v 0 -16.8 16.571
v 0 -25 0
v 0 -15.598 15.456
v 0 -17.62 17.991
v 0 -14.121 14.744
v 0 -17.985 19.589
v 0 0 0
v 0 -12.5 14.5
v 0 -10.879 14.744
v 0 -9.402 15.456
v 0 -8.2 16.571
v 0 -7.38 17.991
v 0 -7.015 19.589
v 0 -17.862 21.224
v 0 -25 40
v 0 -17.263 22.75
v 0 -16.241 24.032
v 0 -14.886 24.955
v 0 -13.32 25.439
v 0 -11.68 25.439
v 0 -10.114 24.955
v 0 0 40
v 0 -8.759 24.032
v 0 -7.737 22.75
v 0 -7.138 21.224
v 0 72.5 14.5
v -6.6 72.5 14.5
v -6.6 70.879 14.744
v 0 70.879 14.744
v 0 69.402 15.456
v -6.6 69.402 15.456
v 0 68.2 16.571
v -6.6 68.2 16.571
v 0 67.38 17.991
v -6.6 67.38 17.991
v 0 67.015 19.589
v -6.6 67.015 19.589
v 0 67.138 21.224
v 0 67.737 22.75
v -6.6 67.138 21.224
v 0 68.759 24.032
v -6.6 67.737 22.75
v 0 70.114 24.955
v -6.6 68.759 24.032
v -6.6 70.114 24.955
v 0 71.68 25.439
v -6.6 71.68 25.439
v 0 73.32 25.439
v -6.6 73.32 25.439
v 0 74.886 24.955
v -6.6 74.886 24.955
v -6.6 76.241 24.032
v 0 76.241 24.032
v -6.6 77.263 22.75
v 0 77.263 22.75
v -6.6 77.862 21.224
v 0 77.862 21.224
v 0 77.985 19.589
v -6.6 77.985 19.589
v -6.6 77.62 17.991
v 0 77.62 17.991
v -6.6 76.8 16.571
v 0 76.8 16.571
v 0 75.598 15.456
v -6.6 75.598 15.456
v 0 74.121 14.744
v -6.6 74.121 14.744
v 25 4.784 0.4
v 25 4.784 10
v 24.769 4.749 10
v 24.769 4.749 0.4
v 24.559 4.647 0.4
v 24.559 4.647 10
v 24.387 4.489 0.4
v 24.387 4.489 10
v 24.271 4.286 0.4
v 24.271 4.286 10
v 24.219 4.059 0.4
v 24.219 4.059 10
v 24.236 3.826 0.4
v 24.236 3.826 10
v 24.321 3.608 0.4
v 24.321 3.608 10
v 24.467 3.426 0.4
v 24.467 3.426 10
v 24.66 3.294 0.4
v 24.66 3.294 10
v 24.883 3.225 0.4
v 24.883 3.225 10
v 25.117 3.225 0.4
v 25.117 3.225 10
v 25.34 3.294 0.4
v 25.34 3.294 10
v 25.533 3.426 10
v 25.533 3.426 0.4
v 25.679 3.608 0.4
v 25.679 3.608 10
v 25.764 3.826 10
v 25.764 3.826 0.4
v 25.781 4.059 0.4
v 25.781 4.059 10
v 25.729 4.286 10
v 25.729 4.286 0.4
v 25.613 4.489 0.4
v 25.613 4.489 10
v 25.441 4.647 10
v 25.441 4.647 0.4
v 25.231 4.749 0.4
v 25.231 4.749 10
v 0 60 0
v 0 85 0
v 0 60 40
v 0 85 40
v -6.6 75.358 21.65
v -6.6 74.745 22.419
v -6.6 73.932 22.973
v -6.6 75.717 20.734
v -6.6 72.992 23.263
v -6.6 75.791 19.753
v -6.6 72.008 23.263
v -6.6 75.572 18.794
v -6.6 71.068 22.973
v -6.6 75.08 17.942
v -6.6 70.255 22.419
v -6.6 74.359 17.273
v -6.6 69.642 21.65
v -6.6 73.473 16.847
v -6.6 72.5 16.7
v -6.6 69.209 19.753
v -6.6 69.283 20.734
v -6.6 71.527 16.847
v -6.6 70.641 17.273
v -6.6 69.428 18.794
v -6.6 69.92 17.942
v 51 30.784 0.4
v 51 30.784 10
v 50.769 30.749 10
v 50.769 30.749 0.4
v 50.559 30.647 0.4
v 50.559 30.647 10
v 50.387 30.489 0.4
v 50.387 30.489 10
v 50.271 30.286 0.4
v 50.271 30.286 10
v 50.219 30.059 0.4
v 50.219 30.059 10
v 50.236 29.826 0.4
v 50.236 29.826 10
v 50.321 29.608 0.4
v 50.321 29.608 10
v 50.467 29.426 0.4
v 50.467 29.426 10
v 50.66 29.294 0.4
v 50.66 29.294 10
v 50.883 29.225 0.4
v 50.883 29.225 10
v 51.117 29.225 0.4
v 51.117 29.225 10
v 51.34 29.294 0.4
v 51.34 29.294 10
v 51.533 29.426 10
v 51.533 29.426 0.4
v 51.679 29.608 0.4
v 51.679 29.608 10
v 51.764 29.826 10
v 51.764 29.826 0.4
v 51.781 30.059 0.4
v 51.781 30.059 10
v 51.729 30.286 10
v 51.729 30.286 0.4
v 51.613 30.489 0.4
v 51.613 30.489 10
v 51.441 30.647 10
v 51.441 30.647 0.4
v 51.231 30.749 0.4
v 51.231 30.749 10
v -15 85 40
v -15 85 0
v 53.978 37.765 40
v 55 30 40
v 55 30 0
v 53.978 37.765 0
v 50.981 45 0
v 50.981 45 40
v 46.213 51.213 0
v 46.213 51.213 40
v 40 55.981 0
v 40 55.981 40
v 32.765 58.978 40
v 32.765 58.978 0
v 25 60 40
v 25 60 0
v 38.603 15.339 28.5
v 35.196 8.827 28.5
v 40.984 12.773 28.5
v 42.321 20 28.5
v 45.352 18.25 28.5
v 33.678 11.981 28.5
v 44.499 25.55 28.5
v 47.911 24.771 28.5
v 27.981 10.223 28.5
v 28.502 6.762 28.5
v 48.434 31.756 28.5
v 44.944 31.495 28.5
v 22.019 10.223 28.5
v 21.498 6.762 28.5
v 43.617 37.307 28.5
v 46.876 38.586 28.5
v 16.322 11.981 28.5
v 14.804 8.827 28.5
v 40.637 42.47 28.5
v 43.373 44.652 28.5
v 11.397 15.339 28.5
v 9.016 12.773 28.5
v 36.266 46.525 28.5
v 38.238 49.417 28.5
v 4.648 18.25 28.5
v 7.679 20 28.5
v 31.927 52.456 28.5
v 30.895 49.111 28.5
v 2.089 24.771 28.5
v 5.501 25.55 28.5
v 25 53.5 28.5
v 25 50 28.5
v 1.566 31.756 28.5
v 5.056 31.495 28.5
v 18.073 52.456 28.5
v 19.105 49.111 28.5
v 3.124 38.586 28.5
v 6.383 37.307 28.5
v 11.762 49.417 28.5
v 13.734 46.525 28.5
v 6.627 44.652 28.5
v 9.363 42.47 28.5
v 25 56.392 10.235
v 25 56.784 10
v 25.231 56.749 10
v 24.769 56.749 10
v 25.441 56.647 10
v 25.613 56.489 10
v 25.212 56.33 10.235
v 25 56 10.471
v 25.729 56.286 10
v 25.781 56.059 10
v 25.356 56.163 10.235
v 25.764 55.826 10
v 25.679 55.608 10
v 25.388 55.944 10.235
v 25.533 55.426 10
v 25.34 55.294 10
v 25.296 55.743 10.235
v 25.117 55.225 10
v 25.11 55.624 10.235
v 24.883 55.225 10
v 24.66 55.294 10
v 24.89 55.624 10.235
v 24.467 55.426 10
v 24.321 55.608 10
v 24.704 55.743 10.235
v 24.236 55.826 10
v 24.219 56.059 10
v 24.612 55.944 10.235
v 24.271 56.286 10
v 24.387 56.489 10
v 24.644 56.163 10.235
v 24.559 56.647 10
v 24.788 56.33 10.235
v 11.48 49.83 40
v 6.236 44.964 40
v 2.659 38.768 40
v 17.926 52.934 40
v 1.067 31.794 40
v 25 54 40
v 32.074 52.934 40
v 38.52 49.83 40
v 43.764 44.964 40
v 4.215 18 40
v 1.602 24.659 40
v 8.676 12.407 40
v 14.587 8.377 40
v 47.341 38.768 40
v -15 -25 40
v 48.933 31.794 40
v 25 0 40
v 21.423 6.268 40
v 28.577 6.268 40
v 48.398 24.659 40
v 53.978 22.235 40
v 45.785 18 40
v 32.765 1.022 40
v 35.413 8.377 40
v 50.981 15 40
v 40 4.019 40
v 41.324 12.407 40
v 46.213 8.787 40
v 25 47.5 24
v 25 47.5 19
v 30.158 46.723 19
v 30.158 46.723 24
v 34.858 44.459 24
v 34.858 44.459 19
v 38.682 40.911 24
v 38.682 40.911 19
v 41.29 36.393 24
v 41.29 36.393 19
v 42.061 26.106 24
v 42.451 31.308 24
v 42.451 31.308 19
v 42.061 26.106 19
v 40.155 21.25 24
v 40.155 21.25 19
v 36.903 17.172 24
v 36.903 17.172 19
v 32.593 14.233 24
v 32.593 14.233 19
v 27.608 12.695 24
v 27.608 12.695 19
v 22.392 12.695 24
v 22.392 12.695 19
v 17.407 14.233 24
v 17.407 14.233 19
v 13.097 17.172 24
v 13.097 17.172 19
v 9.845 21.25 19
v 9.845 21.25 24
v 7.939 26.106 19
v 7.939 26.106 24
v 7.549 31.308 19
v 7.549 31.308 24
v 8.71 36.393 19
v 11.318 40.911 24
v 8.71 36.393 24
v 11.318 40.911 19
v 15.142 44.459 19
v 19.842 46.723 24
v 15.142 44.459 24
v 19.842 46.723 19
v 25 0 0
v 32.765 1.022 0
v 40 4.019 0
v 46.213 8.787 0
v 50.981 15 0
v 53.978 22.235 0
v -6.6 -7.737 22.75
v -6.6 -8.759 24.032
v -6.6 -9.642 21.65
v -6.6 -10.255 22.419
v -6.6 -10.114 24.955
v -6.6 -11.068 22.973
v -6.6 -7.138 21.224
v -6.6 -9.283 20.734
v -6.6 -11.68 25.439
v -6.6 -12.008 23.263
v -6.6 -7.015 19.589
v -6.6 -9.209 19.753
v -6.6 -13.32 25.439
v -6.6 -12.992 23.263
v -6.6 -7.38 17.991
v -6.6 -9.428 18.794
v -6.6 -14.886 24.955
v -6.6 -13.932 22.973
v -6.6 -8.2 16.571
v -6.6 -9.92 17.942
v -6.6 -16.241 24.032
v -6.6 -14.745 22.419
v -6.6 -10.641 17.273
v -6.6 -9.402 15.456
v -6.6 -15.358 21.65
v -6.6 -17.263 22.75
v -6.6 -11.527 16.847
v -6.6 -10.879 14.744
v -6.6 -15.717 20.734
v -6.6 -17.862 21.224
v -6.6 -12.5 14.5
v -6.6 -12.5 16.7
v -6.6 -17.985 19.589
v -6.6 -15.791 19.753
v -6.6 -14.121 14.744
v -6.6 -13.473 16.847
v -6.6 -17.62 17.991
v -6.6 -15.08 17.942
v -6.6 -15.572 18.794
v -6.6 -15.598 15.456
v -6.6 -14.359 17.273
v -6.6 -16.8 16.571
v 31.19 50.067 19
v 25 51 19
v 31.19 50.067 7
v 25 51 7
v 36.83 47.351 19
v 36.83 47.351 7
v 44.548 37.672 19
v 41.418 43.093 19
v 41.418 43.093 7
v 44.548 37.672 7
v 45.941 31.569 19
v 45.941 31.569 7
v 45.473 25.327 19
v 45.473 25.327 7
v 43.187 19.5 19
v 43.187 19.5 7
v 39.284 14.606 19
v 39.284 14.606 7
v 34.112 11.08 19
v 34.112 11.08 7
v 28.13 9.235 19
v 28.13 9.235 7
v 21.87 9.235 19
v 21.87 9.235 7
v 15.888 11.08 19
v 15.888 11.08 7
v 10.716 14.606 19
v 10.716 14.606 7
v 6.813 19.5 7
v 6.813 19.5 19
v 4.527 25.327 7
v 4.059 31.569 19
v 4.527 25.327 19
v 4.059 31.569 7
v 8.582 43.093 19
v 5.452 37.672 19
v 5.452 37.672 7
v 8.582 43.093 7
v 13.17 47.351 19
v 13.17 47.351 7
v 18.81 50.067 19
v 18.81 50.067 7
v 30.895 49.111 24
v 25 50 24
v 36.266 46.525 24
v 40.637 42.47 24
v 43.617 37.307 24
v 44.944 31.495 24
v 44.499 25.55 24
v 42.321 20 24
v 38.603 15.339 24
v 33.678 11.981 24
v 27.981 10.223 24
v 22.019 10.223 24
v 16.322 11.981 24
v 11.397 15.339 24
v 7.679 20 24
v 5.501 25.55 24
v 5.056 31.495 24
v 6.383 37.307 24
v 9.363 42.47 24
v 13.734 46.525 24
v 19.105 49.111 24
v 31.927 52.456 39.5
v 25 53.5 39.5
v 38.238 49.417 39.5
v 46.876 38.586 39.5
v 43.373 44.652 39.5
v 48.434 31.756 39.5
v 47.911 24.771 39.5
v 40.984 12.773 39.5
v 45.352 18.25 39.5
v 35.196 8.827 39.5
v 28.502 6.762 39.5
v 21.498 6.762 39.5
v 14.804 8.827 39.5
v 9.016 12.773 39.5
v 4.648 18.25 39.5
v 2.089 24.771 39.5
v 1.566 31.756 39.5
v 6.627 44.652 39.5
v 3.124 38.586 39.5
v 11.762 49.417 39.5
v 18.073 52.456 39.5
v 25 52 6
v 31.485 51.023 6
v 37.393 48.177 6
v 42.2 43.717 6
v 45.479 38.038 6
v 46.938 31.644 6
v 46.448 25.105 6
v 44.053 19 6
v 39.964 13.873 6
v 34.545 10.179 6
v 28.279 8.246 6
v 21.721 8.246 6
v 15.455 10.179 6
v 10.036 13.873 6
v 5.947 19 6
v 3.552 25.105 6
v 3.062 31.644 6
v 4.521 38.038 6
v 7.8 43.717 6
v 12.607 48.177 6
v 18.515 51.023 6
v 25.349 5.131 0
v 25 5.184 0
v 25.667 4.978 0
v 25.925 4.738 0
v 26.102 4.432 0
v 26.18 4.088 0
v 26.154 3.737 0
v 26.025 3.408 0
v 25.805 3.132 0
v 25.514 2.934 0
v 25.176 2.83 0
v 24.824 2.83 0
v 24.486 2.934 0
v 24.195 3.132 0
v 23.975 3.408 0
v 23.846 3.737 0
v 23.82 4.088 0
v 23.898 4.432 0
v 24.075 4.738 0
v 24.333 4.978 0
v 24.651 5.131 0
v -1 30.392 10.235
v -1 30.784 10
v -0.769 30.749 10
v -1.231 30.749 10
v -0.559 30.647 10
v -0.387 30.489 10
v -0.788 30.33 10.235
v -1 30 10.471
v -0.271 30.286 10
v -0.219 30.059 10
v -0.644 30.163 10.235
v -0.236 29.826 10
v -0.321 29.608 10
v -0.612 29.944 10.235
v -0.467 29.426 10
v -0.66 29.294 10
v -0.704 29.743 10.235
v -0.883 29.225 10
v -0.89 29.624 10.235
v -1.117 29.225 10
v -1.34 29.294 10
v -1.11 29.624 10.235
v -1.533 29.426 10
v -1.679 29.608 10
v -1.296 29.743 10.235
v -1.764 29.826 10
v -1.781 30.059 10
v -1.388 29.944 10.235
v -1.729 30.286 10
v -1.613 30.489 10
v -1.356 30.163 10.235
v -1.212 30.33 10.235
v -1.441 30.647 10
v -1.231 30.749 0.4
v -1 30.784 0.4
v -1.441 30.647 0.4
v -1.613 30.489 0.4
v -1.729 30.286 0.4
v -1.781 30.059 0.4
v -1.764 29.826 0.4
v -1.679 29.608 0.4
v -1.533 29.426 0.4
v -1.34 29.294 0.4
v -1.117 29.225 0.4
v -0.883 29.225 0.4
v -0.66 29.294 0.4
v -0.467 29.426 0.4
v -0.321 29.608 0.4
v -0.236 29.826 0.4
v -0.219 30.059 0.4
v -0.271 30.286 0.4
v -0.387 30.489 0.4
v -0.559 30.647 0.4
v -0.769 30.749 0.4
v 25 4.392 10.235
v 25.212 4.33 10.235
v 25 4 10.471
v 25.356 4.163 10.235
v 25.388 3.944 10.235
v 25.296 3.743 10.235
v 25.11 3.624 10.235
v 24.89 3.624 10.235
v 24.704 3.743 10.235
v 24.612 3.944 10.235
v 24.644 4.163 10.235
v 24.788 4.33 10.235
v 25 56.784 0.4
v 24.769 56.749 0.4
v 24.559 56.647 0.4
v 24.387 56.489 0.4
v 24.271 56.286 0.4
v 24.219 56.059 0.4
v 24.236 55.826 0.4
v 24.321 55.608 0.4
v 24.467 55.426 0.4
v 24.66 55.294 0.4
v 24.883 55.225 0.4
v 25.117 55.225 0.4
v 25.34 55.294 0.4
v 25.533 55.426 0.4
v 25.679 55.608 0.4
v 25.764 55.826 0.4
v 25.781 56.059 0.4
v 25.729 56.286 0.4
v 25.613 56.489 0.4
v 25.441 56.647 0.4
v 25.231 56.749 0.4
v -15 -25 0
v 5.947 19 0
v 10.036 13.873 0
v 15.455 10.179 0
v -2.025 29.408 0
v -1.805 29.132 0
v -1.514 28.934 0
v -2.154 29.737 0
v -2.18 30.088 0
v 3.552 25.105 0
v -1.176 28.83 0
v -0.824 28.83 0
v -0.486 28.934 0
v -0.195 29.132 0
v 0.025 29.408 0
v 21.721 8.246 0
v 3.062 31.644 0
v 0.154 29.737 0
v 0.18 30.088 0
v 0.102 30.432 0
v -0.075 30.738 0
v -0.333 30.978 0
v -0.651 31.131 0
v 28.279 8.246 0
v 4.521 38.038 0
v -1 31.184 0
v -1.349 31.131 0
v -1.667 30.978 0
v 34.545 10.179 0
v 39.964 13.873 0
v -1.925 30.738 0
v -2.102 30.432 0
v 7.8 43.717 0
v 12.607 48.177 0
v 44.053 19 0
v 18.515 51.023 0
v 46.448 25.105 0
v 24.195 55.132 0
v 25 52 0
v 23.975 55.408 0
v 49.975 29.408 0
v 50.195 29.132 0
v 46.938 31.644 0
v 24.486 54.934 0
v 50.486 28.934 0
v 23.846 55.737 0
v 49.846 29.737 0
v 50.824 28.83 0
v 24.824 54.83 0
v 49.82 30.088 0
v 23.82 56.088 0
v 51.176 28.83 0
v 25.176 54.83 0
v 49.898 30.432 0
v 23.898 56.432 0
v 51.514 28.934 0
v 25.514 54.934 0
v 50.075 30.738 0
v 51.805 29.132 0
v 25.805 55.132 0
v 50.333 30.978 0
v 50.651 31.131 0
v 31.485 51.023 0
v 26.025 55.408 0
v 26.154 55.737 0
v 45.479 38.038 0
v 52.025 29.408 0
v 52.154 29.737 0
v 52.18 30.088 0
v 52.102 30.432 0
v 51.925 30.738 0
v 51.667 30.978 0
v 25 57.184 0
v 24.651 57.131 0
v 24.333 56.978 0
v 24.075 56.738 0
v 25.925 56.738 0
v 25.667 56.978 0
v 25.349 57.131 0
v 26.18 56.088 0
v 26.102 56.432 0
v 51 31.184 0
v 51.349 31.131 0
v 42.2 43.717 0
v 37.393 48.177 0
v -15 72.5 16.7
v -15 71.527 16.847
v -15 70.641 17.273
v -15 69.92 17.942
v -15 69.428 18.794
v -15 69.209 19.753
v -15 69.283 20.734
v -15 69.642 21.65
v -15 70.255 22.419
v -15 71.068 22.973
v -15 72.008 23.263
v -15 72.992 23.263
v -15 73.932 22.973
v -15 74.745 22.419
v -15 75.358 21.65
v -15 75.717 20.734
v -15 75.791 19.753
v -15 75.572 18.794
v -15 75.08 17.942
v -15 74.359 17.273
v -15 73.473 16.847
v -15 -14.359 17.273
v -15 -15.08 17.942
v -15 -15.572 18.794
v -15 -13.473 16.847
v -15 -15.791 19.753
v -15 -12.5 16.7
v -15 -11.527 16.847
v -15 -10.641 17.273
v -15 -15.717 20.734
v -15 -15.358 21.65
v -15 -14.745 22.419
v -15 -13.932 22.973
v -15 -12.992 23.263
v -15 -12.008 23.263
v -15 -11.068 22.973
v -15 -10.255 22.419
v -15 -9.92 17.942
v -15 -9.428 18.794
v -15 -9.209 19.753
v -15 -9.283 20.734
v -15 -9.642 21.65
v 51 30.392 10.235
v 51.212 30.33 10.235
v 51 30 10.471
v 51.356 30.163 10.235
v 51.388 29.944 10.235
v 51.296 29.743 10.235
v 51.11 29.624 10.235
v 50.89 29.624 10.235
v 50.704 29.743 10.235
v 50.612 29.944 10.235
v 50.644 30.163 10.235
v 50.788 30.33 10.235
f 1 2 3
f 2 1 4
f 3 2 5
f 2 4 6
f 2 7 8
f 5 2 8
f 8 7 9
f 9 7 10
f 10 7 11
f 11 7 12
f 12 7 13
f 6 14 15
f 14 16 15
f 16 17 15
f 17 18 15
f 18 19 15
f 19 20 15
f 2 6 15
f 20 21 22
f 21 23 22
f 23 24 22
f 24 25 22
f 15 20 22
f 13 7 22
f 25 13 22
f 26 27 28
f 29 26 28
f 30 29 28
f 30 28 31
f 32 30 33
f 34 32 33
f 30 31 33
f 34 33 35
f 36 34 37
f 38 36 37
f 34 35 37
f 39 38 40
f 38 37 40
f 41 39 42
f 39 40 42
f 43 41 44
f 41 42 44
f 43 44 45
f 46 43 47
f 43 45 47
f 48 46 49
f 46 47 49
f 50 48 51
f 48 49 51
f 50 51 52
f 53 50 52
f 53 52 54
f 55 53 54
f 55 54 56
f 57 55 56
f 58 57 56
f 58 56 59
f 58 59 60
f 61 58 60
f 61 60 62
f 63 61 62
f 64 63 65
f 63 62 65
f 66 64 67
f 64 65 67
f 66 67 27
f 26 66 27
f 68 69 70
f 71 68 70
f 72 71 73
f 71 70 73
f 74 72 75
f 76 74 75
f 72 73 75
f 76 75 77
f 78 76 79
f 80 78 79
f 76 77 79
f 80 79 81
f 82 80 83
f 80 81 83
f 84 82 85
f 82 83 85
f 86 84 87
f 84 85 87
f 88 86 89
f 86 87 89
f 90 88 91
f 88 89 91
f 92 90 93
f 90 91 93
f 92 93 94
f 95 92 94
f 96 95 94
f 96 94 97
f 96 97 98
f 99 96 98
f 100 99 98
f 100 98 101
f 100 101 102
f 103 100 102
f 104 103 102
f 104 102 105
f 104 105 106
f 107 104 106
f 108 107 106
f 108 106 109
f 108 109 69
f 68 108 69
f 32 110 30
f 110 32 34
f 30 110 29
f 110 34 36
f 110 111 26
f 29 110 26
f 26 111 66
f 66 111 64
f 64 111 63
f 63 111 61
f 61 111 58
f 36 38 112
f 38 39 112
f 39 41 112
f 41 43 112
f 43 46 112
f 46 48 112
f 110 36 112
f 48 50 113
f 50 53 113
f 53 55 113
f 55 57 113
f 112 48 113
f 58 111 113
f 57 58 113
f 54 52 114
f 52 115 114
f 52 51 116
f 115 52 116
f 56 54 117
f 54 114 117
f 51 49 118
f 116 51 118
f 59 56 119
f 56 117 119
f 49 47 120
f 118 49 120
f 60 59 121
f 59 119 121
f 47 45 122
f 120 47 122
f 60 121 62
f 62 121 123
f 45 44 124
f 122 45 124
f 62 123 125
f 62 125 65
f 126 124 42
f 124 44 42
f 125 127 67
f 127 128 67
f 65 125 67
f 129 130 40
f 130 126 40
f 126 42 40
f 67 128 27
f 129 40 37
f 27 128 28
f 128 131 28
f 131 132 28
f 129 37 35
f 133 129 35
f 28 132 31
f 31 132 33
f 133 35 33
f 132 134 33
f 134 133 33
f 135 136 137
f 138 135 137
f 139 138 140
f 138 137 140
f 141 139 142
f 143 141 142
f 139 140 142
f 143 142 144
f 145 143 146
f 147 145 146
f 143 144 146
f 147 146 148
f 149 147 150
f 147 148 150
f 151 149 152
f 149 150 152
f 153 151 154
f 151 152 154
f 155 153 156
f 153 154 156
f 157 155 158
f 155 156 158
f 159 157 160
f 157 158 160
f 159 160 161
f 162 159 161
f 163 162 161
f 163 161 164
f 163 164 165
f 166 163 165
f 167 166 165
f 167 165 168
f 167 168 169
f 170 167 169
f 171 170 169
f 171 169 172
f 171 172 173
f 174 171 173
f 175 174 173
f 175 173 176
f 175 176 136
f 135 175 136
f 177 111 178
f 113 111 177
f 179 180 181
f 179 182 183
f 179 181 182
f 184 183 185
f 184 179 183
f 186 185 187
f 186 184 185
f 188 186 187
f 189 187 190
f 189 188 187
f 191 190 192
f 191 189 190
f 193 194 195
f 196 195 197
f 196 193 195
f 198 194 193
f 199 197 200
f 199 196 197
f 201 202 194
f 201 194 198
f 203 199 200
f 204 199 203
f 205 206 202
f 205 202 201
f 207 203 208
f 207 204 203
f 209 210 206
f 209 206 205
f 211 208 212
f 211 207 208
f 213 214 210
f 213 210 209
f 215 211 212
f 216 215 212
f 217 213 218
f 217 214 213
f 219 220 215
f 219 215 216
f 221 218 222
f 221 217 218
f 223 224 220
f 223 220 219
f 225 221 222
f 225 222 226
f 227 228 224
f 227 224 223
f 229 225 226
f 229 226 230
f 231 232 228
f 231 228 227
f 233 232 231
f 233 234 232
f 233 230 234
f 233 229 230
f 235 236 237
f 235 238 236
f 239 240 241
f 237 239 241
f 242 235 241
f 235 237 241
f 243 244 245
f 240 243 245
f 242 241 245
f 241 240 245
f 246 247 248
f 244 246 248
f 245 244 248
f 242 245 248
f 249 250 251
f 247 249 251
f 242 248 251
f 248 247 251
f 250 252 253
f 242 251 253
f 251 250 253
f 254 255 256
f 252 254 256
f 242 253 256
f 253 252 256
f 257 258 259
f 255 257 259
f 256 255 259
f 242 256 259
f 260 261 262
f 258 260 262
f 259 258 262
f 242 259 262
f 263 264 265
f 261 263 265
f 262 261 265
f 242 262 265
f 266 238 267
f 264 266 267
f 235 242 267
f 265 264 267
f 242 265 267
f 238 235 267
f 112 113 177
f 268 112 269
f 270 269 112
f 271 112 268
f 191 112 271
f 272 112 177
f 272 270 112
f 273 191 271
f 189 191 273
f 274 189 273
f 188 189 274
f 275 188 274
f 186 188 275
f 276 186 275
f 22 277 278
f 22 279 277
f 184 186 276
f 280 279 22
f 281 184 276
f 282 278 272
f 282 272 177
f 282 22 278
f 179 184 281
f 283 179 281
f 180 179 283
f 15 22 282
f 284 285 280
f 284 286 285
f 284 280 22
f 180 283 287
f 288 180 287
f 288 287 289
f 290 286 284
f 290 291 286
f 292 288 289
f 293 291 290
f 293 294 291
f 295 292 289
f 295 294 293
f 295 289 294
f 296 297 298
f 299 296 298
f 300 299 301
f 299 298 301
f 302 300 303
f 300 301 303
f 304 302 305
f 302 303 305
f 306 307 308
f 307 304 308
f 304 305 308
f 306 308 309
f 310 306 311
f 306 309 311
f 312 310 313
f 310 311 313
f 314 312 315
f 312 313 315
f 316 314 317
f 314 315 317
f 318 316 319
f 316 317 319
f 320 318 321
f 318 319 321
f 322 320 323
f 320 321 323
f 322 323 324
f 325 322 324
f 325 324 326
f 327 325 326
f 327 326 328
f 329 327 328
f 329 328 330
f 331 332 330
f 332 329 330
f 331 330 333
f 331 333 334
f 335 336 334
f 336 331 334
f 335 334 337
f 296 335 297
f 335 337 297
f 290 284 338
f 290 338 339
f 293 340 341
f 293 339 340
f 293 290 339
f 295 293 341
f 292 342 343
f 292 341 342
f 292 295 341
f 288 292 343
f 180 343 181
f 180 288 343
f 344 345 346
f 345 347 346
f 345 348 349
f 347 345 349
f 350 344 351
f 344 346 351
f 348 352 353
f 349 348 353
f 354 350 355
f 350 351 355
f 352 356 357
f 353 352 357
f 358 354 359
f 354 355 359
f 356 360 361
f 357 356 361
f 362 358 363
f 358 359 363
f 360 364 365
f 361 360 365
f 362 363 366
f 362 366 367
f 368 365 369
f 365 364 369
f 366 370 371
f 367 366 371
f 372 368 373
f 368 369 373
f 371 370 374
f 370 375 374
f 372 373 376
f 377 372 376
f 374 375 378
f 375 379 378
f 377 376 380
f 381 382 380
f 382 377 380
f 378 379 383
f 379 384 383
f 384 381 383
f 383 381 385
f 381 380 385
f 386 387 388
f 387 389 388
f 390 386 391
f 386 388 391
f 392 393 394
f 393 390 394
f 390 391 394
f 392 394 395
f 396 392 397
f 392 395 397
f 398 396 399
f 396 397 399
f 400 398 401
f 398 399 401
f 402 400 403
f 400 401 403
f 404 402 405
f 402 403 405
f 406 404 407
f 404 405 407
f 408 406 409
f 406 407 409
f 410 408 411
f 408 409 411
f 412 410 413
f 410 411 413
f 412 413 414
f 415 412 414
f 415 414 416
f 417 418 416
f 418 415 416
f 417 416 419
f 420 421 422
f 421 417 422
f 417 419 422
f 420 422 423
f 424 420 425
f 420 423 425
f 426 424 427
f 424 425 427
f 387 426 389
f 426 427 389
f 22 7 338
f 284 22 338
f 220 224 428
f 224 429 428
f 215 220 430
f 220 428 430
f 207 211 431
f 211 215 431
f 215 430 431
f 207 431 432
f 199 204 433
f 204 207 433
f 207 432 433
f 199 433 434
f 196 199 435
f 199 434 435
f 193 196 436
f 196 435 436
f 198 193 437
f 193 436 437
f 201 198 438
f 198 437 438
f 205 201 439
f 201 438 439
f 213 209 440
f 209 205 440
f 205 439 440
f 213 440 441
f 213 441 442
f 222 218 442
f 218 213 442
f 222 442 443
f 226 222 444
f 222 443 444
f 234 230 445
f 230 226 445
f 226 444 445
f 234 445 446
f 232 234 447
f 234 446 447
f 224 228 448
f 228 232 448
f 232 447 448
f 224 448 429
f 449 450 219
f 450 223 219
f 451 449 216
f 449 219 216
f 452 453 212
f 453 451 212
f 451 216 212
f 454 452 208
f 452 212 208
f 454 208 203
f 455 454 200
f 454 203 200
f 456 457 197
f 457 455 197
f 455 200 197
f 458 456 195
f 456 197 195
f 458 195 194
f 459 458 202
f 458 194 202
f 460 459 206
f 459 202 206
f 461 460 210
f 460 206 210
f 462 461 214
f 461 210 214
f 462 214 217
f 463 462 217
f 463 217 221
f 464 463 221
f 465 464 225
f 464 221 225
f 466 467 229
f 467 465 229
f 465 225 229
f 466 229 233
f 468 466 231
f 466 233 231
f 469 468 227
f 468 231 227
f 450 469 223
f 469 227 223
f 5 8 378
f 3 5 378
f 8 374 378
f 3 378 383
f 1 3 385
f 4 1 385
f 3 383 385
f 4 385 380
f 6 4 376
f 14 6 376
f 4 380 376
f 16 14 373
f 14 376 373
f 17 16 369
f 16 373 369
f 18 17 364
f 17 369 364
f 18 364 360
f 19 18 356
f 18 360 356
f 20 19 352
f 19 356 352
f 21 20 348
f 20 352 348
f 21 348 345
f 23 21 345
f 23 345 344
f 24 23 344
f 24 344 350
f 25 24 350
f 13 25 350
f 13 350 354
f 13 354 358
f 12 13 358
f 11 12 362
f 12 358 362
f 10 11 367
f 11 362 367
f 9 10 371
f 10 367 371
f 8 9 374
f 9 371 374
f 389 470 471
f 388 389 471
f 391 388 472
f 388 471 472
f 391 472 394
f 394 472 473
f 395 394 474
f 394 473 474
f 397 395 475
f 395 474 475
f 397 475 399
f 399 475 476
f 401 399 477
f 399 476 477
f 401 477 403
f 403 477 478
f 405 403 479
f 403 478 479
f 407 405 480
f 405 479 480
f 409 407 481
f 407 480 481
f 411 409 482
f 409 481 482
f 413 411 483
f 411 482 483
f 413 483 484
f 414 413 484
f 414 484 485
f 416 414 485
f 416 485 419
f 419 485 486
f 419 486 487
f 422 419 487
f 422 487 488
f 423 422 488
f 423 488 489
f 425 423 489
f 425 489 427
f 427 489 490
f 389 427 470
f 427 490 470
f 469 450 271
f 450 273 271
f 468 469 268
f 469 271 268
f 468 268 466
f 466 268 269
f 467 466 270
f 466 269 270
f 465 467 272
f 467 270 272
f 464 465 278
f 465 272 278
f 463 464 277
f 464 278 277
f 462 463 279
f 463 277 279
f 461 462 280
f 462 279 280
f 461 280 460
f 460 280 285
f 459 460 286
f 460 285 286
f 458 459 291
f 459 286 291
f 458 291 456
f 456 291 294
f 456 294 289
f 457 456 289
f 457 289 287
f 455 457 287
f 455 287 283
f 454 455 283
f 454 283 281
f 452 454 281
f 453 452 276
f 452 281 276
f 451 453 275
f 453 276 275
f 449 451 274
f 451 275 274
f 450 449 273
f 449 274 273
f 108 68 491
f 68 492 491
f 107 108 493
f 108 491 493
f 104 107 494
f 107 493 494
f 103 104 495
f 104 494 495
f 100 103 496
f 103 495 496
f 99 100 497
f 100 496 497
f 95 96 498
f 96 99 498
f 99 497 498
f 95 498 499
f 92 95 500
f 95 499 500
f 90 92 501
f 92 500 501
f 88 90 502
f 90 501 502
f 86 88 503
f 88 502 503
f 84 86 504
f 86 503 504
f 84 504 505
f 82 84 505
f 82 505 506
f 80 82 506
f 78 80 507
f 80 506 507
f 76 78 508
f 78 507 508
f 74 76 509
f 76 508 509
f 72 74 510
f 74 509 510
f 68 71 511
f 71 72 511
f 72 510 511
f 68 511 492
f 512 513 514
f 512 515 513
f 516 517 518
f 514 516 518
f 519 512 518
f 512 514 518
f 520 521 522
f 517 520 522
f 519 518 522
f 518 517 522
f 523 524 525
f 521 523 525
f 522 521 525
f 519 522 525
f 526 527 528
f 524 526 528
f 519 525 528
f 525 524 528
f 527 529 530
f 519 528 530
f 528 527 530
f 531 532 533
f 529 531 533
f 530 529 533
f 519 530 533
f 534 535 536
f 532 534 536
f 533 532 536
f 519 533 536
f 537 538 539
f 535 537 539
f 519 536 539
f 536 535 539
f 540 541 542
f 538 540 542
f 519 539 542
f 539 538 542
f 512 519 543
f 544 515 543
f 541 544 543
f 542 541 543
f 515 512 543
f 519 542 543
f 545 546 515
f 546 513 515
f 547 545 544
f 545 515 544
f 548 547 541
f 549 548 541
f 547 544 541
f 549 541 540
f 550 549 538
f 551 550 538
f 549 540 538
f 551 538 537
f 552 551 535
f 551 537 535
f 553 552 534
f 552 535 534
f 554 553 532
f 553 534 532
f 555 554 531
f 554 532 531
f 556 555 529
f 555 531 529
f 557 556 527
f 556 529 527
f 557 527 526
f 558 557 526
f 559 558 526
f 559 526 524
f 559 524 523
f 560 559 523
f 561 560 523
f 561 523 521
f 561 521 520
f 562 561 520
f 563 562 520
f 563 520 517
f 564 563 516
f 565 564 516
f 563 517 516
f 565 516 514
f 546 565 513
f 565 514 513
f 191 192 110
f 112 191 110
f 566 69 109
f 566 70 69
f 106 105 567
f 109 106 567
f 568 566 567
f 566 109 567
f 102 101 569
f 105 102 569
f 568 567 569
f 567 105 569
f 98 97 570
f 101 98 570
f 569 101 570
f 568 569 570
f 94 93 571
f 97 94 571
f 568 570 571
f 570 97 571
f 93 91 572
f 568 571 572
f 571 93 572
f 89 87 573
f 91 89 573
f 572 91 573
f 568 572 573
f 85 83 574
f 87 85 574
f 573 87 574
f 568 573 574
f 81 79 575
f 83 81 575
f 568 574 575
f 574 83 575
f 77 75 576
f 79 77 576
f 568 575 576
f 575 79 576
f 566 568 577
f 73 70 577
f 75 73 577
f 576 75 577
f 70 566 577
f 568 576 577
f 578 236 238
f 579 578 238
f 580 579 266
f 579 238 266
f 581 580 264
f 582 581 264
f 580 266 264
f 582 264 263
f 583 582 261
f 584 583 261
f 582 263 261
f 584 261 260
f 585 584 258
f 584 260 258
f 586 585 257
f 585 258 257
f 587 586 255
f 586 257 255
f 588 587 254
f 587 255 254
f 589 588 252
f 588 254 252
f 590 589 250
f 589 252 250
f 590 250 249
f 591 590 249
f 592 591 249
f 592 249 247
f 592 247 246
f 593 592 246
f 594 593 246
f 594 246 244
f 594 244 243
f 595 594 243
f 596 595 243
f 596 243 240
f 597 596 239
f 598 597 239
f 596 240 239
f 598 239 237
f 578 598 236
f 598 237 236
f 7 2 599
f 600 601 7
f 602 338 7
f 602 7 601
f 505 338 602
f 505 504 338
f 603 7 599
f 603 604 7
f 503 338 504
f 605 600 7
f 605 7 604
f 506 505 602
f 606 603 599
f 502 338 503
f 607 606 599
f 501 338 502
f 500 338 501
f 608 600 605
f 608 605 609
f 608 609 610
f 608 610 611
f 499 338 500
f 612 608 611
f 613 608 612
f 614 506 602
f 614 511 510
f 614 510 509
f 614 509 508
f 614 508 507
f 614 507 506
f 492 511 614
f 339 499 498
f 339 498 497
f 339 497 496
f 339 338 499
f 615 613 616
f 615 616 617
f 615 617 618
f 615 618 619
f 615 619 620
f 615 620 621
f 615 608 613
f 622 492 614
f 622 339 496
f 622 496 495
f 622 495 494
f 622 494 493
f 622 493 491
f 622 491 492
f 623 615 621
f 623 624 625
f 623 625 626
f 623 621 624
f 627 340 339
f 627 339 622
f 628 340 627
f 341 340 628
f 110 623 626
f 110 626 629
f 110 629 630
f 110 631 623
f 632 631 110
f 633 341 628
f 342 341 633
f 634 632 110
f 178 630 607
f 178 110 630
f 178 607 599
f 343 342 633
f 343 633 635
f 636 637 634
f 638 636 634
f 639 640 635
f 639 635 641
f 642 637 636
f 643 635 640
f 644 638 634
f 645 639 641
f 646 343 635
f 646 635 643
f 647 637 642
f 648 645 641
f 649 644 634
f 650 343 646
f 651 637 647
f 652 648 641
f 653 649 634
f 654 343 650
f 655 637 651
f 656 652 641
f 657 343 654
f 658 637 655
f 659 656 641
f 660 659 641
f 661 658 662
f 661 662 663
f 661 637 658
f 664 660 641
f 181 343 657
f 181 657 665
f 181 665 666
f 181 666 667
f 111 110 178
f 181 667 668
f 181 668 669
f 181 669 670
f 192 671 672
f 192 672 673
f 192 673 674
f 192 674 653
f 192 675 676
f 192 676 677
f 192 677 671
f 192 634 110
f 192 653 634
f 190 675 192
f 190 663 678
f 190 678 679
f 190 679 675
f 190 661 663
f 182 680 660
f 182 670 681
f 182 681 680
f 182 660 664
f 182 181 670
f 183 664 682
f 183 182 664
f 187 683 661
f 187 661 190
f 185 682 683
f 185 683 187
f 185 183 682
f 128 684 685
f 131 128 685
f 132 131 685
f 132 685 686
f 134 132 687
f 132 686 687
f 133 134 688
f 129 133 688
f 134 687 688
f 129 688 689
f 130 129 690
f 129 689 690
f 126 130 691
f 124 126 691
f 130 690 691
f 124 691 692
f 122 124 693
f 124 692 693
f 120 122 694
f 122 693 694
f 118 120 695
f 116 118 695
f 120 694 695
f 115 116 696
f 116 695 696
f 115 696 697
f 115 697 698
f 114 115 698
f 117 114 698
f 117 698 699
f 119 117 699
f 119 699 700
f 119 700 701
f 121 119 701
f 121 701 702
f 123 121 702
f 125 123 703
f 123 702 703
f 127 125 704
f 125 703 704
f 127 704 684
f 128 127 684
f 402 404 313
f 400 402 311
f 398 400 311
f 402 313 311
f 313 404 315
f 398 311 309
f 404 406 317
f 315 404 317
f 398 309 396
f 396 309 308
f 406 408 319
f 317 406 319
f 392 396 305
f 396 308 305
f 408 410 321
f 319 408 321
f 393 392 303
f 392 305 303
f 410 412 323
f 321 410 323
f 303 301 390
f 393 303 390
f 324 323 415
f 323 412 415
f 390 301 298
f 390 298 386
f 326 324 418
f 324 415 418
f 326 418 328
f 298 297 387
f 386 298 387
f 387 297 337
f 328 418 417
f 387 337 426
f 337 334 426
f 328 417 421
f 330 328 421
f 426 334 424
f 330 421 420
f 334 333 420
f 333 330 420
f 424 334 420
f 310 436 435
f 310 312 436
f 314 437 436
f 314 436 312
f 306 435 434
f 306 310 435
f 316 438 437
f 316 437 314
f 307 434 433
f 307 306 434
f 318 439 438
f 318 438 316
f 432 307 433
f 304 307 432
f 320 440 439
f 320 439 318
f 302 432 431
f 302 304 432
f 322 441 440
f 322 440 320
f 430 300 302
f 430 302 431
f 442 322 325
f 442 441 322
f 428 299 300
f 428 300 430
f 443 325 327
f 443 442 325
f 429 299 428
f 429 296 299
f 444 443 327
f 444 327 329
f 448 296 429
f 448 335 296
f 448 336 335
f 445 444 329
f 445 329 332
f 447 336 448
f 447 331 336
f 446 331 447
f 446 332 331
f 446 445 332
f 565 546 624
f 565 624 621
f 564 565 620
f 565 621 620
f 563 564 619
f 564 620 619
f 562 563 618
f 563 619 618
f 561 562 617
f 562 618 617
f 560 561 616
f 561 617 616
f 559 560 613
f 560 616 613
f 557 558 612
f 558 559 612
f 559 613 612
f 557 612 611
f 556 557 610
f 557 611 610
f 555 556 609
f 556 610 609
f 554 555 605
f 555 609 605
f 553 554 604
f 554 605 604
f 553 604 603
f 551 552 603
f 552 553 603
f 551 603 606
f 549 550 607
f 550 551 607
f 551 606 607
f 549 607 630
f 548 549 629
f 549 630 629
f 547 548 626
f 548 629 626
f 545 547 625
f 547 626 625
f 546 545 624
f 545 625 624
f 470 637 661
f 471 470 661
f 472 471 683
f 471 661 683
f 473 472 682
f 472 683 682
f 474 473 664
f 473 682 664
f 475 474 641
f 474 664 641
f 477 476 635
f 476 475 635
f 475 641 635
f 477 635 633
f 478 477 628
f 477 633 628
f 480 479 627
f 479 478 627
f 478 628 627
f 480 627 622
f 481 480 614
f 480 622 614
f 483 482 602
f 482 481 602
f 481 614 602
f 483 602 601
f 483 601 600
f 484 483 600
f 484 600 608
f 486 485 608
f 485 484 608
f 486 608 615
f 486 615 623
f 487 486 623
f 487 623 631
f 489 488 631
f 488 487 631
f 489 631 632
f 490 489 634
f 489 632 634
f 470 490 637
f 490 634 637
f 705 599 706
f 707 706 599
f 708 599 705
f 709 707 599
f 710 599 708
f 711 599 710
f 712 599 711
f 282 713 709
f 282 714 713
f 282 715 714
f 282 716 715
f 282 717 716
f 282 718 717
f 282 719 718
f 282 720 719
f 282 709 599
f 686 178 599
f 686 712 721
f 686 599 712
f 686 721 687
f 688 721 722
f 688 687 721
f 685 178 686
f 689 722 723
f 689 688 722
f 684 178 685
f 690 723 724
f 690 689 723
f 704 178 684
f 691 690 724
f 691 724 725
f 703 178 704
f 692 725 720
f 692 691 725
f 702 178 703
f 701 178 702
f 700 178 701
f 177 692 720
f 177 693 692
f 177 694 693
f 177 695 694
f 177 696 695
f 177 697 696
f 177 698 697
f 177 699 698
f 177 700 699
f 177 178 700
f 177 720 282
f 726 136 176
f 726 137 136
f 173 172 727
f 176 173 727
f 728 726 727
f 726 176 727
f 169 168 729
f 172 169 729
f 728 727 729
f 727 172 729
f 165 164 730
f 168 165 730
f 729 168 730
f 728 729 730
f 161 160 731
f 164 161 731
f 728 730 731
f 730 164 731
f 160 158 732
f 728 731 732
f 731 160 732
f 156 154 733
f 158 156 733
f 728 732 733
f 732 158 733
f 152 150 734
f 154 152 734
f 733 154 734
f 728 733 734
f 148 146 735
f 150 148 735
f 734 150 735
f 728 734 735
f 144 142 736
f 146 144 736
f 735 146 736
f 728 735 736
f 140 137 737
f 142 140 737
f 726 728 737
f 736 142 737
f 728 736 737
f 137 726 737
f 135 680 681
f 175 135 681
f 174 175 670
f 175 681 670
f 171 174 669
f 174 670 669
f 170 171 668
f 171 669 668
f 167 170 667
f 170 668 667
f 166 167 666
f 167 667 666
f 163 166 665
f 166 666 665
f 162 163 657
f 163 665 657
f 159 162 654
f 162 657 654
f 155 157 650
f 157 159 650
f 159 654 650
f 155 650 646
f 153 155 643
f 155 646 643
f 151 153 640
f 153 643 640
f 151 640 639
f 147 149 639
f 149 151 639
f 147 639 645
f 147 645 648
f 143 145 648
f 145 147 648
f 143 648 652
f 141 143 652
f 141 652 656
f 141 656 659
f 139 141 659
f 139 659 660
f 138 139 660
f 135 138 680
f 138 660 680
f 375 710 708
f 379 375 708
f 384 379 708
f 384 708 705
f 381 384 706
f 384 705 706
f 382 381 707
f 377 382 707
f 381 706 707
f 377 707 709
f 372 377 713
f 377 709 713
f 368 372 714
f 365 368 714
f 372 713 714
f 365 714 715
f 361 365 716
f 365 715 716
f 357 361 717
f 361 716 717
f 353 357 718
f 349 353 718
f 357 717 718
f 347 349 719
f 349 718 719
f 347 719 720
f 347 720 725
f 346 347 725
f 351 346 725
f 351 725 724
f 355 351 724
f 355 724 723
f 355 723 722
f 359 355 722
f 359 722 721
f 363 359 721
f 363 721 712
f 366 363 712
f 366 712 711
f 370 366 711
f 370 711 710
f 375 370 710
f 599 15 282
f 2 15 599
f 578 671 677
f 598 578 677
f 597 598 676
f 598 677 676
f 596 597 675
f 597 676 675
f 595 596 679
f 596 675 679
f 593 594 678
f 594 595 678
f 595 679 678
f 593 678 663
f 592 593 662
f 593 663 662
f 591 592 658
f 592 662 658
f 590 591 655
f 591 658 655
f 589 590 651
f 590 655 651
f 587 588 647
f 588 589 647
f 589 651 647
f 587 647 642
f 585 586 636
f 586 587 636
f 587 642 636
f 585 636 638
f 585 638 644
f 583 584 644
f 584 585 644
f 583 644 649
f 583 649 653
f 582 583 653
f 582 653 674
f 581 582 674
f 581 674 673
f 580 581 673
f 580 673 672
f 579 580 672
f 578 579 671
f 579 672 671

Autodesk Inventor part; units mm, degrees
ref_plane "YZ Plane" through (0, 0, 0) normal (1, 0, 0) x (0, 1, 0)
ref_plane "XZ Plane" through (0, 0, 0) normal (0, 1, 0) x (-1, 0, 0)
sketch "Skizze1" plane through (0, 0, 0) normal (0, 0, 1) x (1, 0, 0)
  line L0 (0, 0) -> (55, 0)
  line L1 (55, 0) -> (55, 60)
  line L2 (55, 60) -> (0, 60)
  line L3 (0, 60) -> (0, 0)
  dimension "d0" = 60
  dimension "d1" = 55
extrude "Grundkörper" add sketch "Skizze1" along normal blind 40
fillet "Konturverrundung" radius 30 2 edges at (55, 60, 20) (55, 0, 20)
sketch "Skizze2" plane through (0, 0, 40) normal (0, 0, 1) x (1, 0, 0)
  point P0 (0, 0)
  point P1 (25, 30)
  point P2 (25, 30)
hole "Durchgangsbohrung 60H7" at (25, 30, 40) direction (0, 0, -1) diameter 55 end through all
sketch "Skizze3" plane through (0, 0, 0) normal (-1, 0, 0) x (0, 0, 1)
  line L0 (0, 0) -> (40, 0) construction
  line L1 (40, 60) -> (40, 0) construction
  line L2 (0, 0) -> (40, 60) construction
  line L3 (0, 60) -> (40, 60) construction
  line L4 (0, 60) -> (40, 0) construction
  line L5 (0, 85) -> (40, 85)
  line L6 (40, 85) -> (40, -25)
  line L7 (40, -25) -> (0, -25)
  line L8 (0, -25) -> (0, 85)
  line L9 (0, 85) -> (40, -25) construction
  line L10 (40, 85) -> (0, -25) construction
  point P0 (20, 30)
  dimension "d16" = 110
extrude "Aufnahmeplatte" add sketch "Skizze3" along normal blind 15
sketch "Skizze4" plane through (0, 0, 0) normal (1, 0, 0) x (0, 0, -1)
  line L0 (-40, 85) -> (0, 85) projected
  line L1 (-20, 85) -> (-20, -25)
  line L2 (-40, -25) -> (0, -25) projected
  line L3 (0, 60) -> (-40, 60) projected
  line L4 (8, 30) -> (-48, 30) projected
  point P0 (0, 0)
  point P1 (-20, 72.5)
  point P2 (-20, -12.5)
  dimension "d26" = 25
  dimension "d27" = 12.5
hole "Senkung_Zylinderkopfschraube M6" at (0, 72.5, 20) at (0, -12.5, 20) direction (-1, 0, 0) diameter 6.6 end through all counterbore diameter 11 counterbore depth 6.6 clearance for "Inbusschraube DIN EN ISO 4762" size "M6" standard "DIN"
ref_plane "Konstruktionshilfsebene" through (25, 30, 0) normal (-1, 0, 0) x (0, -1, 0)
ref_plane "Arbeitsebene3" through (55, 30, 0) normal (-1, 0, 0) x (0, -1, 0)
sketch "Skizze6" plane through (25, 30, 0) normal (-1, 0, 0) x (0, -1, 0)
  line L0 (-27.5, 0) -> (-27.5, 40) construction
  line L1 (-6.1835, 0) -> (-3.8165, 0) construction
  line L2 (0, 0) -> (0, 40) construction
  line L3 (-27.5, 40) -> (27.5, 40) construction
  line L4 (-27.5, 40) -> (-23.5, 40)
  line L5 (-23.5, 40) -> (-23.5, 28.5)
  line L6 (-23.5, 28.5) -> (-20, 28.5)
  line L7 (-20, 28.5) -> (-20, 24)
  line L8 (-17.5, 24) -> (-17.5, 19)
  line L9 (-17.5, 19) -> (-21, 19)
  line L10 (-21, 19) -> (-21, 7)
  line L11 (-21, 7) -> (-21, 7)
  line L12 (-22, 6) -> (-22, 0)
  line L13 (27.5, 0) -> (-27.5, 0) construction
  line L14 (-22, 0) -> (-27.5, 0)
  line L15 (-21, 7) -> (-22, 6)
  line L16 (-27.5, 40) -> (-27.5, 0)
  line L17 (-20, 24) -> (-17.5, 24)
  point P0 (30, 0)
  point P1 (-22, 7)
  dimension "d46" = 47
  dimension "d47" = 11.5
  dimension "d48" = 40
  dimension "d49" = 35
  dimension "d52" = 33
  dimension "d53" = 21
  dimension "d54" = 42
  dimension "d55" = 44
  dimension "d57" = 1
  dimension "d58" = 1
  dimension "d79" = 9.5
  dimension "d80" = 16
revolve "Lagersitz" add sketch "Skizze6" angle 360 about axis through (25, 30, 0) along (0, 0, 1)
sketch "Skizze8" plane through (0, 0, 0) normal (0, 0, -1) x (-1, 0, 0)
  circle A0 centre (-25, 30) radius 17.5 construction
  line L0 (-25, 60) -> (0, 60) construction
  line L1 (-25, 30) -> (-25, 60) construction
  line L2 (-25, 30) -> (-55, 30) construction
  arc A1 (-25, 60) -> (-25, 0) centre (-25, 30) ccw construction
  circle A2 centre (-25, 30) radius 26 construction
  point P0 (0, 0)
  point P1 (-25, 56)
  point P2 (-51, 30)
  point P3 (-25, 4)
  point P4 (1, 30)
  dimension "d68" = 52
  dimension "d67" = 30
  dimension "d71" = 360
hole "Gewinde_Keine_ISO Metrisches Profil_2_Winkel(5)" at (25, 56, 0) at (51, 30, 0) at (25, 4, 0) at (-1, 30, 0) direction (0, 0, 1) diameter 1.567 depth 10 tip angle 118 thread size "M2x0.4" class "6H" standard "ISO Metric profile"
chamfer "Gewindesenkung 0.4mm" distance 0.4 angle 45 4 edges at (25, 55.2165, 0) (51, 29.2165, 0) (-1, 29.2165, 0) (25, 3.2165, 0)
chamfer "Fase4" distance 0.5 angle 45 1 edges at (25, 6.5, 40)
equation "\"d27\" = 0.5 * d26"
equation "\"d58\" = d57"
properties part number "shoulder_joint_fit_v2" material "Stahl, hochfest, niedrig legiert"
